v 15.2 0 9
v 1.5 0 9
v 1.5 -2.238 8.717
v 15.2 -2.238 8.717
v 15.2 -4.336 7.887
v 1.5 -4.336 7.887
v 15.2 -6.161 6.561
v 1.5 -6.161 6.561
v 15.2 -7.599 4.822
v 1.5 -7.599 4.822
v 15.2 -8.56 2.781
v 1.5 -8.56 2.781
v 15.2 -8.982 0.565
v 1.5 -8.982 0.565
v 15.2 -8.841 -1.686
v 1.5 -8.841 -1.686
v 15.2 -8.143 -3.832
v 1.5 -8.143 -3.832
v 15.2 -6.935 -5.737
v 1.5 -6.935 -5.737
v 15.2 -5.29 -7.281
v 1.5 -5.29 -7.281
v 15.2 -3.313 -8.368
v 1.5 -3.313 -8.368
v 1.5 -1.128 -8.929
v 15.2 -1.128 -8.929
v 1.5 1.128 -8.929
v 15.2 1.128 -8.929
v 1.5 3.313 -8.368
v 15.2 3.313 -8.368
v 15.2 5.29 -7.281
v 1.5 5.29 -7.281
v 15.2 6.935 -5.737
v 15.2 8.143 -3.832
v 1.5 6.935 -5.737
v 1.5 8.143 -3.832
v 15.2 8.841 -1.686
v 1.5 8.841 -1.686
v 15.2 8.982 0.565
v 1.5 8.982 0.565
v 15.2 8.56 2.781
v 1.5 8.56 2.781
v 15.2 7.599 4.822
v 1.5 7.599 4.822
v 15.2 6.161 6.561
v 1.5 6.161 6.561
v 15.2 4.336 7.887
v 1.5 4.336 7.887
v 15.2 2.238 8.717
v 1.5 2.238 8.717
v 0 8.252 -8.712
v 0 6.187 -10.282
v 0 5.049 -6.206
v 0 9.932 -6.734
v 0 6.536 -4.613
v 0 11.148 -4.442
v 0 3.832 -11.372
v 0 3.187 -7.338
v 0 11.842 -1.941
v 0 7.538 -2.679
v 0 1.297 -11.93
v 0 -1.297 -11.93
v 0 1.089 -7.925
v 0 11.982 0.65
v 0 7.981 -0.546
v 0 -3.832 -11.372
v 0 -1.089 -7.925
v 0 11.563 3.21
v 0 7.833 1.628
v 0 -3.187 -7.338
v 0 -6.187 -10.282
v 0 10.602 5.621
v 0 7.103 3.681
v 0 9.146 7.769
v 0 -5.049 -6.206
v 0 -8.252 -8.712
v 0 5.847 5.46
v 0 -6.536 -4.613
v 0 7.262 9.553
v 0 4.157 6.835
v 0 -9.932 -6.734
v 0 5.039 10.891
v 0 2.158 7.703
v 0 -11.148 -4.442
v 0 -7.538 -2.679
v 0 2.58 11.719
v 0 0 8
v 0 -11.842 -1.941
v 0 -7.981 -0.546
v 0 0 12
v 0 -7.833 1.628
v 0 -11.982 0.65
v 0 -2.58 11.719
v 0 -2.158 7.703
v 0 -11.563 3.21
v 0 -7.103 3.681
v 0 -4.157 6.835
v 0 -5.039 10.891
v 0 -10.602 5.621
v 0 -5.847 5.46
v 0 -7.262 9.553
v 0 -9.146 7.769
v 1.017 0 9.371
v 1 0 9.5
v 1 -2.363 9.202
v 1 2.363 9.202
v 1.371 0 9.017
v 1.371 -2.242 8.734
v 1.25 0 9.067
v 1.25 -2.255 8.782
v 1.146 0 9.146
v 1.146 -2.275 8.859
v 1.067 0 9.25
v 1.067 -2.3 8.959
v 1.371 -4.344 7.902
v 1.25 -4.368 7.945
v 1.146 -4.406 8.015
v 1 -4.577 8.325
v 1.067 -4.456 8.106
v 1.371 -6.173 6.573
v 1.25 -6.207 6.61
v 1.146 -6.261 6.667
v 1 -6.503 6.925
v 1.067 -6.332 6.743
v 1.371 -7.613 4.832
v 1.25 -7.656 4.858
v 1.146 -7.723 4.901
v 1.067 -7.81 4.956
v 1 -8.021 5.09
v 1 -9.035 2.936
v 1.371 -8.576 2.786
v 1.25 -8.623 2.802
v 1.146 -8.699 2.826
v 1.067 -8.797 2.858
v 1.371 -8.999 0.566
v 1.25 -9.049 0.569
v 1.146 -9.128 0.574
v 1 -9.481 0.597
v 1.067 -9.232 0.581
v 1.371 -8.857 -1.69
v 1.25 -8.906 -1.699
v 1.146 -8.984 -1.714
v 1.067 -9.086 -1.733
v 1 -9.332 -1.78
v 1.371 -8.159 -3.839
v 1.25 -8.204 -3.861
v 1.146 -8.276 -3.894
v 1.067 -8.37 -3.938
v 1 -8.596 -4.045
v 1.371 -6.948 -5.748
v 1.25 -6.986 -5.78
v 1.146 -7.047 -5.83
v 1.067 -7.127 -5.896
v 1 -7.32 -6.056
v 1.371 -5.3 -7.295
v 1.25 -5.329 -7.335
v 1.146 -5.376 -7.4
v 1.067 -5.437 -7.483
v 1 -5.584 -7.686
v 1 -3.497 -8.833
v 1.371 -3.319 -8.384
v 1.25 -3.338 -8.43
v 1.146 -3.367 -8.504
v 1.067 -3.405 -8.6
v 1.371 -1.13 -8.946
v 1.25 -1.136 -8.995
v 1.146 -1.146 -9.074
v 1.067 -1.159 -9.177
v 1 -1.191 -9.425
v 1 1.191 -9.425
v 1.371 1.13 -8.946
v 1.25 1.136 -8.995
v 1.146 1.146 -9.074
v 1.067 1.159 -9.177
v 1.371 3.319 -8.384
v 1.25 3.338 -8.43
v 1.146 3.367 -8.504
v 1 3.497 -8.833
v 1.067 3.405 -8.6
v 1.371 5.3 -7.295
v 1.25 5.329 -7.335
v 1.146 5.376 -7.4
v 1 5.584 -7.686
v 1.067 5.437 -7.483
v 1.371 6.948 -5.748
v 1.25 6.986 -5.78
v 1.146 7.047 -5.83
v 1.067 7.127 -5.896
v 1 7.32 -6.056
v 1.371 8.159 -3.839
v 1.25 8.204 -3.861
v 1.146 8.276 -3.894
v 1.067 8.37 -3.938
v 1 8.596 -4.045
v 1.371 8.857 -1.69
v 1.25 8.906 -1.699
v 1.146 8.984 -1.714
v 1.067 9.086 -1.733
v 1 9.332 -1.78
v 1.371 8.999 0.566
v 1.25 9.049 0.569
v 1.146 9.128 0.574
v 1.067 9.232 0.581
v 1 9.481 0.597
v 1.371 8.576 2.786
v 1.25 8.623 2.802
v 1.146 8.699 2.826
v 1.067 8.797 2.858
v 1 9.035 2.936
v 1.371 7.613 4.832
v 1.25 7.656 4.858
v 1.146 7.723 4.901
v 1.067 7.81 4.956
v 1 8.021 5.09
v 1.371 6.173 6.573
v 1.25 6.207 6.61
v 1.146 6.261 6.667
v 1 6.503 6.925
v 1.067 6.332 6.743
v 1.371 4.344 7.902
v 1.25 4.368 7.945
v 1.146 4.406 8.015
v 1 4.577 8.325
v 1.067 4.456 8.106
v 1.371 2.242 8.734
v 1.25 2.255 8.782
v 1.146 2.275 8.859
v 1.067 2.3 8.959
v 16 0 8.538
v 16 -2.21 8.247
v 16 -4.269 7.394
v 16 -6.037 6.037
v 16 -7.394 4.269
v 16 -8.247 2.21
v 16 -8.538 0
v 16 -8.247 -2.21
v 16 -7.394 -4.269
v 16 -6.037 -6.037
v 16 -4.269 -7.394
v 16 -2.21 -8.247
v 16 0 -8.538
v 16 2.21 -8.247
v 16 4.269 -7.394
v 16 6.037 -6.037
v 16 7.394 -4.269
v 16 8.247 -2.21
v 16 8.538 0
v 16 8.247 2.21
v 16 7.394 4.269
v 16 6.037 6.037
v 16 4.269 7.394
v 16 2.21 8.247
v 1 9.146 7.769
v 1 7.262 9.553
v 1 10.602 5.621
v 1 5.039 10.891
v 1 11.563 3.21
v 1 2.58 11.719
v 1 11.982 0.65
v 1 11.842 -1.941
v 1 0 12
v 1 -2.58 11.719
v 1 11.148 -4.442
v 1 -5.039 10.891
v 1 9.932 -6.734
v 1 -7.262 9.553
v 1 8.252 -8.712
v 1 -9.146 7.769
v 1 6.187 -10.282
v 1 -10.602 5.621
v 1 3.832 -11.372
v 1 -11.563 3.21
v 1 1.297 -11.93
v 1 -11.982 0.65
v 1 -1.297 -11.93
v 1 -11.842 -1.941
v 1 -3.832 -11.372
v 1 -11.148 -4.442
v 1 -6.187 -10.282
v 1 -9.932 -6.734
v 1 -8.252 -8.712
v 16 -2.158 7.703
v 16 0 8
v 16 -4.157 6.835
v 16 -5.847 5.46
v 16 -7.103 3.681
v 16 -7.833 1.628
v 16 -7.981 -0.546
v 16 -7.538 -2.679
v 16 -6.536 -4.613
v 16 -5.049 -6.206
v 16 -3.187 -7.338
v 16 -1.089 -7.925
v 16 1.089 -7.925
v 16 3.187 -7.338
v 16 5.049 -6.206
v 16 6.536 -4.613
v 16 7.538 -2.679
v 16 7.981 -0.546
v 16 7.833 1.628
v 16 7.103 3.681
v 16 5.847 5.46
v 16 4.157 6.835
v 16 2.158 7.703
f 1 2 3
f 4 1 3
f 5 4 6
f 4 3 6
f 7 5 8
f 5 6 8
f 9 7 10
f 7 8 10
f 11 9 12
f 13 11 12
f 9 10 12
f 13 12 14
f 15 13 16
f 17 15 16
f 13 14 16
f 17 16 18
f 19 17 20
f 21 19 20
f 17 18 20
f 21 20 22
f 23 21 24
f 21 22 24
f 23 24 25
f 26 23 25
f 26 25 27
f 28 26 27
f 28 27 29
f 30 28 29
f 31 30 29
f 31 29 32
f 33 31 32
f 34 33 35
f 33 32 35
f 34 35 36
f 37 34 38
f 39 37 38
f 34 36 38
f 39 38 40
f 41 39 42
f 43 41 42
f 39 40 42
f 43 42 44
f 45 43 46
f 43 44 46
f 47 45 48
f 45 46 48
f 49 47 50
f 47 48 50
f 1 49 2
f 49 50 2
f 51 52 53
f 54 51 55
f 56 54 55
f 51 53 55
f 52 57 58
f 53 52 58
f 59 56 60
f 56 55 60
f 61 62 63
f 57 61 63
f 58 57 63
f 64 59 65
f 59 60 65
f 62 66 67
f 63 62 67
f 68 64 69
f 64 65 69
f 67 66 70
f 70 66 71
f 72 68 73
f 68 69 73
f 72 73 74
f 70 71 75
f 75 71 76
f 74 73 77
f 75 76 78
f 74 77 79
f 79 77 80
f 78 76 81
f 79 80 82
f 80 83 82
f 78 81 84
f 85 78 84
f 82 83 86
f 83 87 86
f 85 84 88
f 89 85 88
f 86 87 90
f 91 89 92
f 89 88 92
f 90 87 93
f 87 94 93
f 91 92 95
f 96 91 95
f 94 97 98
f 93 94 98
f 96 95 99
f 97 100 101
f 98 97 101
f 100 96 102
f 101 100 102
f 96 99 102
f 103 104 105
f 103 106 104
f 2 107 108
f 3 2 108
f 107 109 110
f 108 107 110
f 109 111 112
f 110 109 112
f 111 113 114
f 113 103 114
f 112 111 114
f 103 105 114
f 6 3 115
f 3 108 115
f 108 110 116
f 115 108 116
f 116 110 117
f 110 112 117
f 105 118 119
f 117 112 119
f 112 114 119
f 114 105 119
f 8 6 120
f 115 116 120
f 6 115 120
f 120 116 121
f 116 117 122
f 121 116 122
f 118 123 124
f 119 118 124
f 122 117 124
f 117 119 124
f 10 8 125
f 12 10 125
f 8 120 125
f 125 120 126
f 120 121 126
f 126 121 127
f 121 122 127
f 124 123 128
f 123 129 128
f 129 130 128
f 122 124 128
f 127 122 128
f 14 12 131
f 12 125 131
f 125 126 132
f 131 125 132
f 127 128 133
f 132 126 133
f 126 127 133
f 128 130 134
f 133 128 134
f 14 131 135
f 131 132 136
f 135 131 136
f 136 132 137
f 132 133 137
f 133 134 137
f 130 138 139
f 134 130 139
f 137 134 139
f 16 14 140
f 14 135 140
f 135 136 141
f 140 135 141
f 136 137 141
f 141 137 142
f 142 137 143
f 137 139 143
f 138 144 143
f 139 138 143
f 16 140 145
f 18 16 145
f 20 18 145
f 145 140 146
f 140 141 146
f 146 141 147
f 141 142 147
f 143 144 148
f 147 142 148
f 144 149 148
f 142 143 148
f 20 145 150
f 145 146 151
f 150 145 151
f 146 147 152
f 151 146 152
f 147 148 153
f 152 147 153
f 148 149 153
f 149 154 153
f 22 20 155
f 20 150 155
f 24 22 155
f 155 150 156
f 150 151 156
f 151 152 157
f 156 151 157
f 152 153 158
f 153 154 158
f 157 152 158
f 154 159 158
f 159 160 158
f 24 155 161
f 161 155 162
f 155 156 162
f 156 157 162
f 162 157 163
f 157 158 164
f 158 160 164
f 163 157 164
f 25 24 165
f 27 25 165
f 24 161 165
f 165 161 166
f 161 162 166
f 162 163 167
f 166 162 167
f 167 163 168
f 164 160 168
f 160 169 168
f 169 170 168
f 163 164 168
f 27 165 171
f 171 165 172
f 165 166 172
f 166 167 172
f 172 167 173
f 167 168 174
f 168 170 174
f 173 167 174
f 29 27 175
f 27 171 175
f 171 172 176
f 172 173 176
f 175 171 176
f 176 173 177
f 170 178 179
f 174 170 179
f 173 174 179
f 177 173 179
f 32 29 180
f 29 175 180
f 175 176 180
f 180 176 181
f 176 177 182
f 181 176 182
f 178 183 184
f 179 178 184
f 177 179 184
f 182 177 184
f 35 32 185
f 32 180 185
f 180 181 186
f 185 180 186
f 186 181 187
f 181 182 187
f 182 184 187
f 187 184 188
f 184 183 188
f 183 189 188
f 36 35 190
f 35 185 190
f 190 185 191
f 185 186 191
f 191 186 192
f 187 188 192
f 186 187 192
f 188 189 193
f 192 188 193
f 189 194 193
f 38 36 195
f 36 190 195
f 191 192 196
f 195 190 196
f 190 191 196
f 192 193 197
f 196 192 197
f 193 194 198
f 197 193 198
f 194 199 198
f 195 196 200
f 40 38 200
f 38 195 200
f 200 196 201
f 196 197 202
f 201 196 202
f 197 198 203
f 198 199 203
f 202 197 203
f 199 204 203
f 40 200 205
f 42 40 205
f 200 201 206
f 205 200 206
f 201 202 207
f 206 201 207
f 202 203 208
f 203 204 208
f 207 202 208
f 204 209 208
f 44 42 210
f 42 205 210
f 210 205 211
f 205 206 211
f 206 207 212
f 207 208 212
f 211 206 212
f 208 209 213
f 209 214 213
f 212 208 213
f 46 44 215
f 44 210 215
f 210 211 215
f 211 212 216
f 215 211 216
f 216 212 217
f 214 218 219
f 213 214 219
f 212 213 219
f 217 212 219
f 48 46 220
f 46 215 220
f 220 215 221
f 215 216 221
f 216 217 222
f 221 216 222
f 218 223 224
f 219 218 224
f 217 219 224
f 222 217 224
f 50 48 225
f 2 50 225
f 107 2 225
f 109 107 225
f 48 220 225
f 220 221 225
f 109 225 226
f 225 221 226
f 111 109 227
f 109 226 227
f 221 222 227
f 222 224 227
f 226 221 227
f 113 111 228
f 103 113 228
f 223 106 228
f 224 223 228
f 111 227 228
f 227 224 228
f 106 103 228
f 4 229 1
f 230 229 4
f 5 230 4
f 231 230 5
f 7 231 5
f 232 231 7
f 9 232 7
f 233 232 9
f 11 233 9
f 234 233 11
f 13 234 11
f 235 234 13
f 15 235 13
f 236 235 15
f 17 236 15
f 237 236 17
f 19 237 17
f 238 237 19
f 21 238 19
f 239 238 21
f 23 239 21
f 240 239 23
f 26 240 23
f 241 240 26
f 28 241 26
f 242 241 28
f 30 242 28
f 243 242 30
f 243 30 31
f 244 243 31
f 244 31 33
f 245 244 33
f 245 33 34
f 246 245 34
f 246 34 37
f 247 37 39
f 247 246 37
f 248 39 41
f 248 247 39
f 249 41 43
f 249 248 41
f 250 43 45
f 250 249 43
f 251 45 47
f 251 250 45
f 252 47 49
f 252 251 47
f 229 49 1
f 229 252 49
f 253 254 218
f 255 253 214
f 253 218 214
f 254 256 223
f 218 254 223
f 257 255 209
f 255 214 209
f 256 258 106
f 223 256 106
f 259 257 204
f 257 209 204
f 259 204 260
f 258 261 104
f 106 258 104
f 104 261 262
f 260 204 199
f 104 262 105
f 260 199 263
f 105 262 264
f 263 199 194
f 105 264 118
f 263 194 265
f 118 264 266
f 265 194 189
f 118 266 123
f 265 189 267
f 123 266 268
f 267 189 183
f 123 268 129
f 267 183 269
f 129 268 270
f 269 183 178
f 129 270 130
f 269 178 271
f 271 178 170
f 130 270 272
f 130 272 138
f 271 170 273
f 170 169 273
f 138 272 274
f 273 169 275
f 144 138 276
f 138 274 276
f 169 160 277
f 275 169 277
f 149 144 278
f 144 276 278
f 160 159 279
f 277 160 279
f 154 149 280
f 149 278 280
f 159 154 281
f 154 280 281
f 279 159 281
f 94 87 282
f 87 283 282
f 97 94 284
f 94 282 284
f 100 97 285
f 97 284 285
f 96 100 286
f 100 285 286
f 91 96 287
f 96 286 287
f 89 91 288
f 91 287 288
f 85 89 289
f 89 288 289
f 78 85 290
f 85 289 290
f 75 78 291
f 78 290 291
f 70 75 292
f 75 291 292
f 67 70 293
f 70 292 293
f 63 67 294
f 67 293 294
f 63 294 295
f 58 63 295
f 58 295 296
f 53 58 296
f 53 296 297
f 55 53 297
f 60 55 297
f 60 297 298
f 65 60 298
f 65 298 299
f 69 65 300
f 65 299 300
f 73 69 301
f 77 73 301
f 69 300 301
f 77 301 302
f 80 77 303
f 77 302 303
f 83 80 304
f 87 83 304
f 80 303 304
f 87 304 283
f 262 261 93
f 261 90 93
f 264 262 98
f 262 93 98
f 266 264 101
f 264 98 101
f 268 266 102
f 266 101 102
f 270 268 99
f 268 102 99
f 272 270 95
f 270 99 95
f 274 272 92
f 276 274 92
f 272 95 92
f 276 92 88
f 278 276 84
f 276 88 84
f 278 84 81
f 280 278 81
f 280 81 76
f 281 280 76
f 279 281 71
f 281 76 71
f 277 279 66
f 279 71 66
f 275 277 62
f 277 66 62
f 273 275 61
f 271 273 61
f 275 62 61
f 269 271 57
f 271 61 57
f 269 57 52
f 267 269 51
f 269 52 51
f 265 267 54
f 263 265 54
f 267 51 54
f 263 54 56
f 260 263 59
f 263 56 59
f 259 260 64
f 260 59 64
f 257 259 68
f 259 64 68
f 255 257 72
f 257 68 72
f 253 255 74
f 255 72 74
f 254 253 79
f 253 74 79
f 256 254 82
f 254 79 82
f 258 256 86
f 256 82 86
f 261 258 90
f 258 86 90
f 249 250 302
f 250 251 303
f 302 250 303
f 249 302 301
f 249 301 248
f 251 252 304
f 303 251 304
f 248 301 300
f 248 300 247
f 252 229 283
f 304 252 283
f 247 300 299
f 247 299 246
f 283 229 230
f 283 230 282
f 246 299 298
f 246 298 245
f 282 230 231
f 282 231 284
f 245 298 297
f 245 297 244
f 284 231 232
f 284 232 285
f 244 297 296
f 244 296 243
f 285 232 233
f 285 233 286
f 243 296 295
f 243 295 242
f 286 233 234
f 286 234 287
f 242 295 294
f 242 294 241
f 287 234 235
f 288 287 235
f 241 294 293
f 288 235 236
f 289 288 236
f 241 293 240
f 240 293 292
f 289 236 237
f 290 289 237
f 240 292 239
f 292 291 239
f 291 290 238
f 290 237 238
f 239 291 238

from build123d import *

# Parameters (mm, degrees)
F2_SIZE2 = 0.4618802154
F2_SIZE  = 0.8
F3_R     = 0.5


with BuildPart() as f1:
    # F0 (on Front) → F1 (revolve)
    with BuildSketch(Plane.XZ):
        Polygon((0, 12), (0, 8), (1, 8), (16, 8), (16, 9), (1, 9), (1, 12), align=None)
    revolve(axis=Axis((8, 0, 0), (1, 0, 0)))

    # F2
    f2_edges = [f1.edges().sort_by_distance(p)[0] for p in [
        (16, 0, -9),
    ]]
    f2_side = f1.faces().sort_by_distance((8.5, 0, -9))[0]
    chamfer(f2_edges, length=F2_SIZE, length2=F2_SIZE2, reference=f2_side)

    # F3
    f3_edges = [f1.edges().sort_by_distance(p)[0] for p in [
        (1, 0, -9),
    ]]
    fillet(f3_edges, radius=F3_R)


solid = f1.part
